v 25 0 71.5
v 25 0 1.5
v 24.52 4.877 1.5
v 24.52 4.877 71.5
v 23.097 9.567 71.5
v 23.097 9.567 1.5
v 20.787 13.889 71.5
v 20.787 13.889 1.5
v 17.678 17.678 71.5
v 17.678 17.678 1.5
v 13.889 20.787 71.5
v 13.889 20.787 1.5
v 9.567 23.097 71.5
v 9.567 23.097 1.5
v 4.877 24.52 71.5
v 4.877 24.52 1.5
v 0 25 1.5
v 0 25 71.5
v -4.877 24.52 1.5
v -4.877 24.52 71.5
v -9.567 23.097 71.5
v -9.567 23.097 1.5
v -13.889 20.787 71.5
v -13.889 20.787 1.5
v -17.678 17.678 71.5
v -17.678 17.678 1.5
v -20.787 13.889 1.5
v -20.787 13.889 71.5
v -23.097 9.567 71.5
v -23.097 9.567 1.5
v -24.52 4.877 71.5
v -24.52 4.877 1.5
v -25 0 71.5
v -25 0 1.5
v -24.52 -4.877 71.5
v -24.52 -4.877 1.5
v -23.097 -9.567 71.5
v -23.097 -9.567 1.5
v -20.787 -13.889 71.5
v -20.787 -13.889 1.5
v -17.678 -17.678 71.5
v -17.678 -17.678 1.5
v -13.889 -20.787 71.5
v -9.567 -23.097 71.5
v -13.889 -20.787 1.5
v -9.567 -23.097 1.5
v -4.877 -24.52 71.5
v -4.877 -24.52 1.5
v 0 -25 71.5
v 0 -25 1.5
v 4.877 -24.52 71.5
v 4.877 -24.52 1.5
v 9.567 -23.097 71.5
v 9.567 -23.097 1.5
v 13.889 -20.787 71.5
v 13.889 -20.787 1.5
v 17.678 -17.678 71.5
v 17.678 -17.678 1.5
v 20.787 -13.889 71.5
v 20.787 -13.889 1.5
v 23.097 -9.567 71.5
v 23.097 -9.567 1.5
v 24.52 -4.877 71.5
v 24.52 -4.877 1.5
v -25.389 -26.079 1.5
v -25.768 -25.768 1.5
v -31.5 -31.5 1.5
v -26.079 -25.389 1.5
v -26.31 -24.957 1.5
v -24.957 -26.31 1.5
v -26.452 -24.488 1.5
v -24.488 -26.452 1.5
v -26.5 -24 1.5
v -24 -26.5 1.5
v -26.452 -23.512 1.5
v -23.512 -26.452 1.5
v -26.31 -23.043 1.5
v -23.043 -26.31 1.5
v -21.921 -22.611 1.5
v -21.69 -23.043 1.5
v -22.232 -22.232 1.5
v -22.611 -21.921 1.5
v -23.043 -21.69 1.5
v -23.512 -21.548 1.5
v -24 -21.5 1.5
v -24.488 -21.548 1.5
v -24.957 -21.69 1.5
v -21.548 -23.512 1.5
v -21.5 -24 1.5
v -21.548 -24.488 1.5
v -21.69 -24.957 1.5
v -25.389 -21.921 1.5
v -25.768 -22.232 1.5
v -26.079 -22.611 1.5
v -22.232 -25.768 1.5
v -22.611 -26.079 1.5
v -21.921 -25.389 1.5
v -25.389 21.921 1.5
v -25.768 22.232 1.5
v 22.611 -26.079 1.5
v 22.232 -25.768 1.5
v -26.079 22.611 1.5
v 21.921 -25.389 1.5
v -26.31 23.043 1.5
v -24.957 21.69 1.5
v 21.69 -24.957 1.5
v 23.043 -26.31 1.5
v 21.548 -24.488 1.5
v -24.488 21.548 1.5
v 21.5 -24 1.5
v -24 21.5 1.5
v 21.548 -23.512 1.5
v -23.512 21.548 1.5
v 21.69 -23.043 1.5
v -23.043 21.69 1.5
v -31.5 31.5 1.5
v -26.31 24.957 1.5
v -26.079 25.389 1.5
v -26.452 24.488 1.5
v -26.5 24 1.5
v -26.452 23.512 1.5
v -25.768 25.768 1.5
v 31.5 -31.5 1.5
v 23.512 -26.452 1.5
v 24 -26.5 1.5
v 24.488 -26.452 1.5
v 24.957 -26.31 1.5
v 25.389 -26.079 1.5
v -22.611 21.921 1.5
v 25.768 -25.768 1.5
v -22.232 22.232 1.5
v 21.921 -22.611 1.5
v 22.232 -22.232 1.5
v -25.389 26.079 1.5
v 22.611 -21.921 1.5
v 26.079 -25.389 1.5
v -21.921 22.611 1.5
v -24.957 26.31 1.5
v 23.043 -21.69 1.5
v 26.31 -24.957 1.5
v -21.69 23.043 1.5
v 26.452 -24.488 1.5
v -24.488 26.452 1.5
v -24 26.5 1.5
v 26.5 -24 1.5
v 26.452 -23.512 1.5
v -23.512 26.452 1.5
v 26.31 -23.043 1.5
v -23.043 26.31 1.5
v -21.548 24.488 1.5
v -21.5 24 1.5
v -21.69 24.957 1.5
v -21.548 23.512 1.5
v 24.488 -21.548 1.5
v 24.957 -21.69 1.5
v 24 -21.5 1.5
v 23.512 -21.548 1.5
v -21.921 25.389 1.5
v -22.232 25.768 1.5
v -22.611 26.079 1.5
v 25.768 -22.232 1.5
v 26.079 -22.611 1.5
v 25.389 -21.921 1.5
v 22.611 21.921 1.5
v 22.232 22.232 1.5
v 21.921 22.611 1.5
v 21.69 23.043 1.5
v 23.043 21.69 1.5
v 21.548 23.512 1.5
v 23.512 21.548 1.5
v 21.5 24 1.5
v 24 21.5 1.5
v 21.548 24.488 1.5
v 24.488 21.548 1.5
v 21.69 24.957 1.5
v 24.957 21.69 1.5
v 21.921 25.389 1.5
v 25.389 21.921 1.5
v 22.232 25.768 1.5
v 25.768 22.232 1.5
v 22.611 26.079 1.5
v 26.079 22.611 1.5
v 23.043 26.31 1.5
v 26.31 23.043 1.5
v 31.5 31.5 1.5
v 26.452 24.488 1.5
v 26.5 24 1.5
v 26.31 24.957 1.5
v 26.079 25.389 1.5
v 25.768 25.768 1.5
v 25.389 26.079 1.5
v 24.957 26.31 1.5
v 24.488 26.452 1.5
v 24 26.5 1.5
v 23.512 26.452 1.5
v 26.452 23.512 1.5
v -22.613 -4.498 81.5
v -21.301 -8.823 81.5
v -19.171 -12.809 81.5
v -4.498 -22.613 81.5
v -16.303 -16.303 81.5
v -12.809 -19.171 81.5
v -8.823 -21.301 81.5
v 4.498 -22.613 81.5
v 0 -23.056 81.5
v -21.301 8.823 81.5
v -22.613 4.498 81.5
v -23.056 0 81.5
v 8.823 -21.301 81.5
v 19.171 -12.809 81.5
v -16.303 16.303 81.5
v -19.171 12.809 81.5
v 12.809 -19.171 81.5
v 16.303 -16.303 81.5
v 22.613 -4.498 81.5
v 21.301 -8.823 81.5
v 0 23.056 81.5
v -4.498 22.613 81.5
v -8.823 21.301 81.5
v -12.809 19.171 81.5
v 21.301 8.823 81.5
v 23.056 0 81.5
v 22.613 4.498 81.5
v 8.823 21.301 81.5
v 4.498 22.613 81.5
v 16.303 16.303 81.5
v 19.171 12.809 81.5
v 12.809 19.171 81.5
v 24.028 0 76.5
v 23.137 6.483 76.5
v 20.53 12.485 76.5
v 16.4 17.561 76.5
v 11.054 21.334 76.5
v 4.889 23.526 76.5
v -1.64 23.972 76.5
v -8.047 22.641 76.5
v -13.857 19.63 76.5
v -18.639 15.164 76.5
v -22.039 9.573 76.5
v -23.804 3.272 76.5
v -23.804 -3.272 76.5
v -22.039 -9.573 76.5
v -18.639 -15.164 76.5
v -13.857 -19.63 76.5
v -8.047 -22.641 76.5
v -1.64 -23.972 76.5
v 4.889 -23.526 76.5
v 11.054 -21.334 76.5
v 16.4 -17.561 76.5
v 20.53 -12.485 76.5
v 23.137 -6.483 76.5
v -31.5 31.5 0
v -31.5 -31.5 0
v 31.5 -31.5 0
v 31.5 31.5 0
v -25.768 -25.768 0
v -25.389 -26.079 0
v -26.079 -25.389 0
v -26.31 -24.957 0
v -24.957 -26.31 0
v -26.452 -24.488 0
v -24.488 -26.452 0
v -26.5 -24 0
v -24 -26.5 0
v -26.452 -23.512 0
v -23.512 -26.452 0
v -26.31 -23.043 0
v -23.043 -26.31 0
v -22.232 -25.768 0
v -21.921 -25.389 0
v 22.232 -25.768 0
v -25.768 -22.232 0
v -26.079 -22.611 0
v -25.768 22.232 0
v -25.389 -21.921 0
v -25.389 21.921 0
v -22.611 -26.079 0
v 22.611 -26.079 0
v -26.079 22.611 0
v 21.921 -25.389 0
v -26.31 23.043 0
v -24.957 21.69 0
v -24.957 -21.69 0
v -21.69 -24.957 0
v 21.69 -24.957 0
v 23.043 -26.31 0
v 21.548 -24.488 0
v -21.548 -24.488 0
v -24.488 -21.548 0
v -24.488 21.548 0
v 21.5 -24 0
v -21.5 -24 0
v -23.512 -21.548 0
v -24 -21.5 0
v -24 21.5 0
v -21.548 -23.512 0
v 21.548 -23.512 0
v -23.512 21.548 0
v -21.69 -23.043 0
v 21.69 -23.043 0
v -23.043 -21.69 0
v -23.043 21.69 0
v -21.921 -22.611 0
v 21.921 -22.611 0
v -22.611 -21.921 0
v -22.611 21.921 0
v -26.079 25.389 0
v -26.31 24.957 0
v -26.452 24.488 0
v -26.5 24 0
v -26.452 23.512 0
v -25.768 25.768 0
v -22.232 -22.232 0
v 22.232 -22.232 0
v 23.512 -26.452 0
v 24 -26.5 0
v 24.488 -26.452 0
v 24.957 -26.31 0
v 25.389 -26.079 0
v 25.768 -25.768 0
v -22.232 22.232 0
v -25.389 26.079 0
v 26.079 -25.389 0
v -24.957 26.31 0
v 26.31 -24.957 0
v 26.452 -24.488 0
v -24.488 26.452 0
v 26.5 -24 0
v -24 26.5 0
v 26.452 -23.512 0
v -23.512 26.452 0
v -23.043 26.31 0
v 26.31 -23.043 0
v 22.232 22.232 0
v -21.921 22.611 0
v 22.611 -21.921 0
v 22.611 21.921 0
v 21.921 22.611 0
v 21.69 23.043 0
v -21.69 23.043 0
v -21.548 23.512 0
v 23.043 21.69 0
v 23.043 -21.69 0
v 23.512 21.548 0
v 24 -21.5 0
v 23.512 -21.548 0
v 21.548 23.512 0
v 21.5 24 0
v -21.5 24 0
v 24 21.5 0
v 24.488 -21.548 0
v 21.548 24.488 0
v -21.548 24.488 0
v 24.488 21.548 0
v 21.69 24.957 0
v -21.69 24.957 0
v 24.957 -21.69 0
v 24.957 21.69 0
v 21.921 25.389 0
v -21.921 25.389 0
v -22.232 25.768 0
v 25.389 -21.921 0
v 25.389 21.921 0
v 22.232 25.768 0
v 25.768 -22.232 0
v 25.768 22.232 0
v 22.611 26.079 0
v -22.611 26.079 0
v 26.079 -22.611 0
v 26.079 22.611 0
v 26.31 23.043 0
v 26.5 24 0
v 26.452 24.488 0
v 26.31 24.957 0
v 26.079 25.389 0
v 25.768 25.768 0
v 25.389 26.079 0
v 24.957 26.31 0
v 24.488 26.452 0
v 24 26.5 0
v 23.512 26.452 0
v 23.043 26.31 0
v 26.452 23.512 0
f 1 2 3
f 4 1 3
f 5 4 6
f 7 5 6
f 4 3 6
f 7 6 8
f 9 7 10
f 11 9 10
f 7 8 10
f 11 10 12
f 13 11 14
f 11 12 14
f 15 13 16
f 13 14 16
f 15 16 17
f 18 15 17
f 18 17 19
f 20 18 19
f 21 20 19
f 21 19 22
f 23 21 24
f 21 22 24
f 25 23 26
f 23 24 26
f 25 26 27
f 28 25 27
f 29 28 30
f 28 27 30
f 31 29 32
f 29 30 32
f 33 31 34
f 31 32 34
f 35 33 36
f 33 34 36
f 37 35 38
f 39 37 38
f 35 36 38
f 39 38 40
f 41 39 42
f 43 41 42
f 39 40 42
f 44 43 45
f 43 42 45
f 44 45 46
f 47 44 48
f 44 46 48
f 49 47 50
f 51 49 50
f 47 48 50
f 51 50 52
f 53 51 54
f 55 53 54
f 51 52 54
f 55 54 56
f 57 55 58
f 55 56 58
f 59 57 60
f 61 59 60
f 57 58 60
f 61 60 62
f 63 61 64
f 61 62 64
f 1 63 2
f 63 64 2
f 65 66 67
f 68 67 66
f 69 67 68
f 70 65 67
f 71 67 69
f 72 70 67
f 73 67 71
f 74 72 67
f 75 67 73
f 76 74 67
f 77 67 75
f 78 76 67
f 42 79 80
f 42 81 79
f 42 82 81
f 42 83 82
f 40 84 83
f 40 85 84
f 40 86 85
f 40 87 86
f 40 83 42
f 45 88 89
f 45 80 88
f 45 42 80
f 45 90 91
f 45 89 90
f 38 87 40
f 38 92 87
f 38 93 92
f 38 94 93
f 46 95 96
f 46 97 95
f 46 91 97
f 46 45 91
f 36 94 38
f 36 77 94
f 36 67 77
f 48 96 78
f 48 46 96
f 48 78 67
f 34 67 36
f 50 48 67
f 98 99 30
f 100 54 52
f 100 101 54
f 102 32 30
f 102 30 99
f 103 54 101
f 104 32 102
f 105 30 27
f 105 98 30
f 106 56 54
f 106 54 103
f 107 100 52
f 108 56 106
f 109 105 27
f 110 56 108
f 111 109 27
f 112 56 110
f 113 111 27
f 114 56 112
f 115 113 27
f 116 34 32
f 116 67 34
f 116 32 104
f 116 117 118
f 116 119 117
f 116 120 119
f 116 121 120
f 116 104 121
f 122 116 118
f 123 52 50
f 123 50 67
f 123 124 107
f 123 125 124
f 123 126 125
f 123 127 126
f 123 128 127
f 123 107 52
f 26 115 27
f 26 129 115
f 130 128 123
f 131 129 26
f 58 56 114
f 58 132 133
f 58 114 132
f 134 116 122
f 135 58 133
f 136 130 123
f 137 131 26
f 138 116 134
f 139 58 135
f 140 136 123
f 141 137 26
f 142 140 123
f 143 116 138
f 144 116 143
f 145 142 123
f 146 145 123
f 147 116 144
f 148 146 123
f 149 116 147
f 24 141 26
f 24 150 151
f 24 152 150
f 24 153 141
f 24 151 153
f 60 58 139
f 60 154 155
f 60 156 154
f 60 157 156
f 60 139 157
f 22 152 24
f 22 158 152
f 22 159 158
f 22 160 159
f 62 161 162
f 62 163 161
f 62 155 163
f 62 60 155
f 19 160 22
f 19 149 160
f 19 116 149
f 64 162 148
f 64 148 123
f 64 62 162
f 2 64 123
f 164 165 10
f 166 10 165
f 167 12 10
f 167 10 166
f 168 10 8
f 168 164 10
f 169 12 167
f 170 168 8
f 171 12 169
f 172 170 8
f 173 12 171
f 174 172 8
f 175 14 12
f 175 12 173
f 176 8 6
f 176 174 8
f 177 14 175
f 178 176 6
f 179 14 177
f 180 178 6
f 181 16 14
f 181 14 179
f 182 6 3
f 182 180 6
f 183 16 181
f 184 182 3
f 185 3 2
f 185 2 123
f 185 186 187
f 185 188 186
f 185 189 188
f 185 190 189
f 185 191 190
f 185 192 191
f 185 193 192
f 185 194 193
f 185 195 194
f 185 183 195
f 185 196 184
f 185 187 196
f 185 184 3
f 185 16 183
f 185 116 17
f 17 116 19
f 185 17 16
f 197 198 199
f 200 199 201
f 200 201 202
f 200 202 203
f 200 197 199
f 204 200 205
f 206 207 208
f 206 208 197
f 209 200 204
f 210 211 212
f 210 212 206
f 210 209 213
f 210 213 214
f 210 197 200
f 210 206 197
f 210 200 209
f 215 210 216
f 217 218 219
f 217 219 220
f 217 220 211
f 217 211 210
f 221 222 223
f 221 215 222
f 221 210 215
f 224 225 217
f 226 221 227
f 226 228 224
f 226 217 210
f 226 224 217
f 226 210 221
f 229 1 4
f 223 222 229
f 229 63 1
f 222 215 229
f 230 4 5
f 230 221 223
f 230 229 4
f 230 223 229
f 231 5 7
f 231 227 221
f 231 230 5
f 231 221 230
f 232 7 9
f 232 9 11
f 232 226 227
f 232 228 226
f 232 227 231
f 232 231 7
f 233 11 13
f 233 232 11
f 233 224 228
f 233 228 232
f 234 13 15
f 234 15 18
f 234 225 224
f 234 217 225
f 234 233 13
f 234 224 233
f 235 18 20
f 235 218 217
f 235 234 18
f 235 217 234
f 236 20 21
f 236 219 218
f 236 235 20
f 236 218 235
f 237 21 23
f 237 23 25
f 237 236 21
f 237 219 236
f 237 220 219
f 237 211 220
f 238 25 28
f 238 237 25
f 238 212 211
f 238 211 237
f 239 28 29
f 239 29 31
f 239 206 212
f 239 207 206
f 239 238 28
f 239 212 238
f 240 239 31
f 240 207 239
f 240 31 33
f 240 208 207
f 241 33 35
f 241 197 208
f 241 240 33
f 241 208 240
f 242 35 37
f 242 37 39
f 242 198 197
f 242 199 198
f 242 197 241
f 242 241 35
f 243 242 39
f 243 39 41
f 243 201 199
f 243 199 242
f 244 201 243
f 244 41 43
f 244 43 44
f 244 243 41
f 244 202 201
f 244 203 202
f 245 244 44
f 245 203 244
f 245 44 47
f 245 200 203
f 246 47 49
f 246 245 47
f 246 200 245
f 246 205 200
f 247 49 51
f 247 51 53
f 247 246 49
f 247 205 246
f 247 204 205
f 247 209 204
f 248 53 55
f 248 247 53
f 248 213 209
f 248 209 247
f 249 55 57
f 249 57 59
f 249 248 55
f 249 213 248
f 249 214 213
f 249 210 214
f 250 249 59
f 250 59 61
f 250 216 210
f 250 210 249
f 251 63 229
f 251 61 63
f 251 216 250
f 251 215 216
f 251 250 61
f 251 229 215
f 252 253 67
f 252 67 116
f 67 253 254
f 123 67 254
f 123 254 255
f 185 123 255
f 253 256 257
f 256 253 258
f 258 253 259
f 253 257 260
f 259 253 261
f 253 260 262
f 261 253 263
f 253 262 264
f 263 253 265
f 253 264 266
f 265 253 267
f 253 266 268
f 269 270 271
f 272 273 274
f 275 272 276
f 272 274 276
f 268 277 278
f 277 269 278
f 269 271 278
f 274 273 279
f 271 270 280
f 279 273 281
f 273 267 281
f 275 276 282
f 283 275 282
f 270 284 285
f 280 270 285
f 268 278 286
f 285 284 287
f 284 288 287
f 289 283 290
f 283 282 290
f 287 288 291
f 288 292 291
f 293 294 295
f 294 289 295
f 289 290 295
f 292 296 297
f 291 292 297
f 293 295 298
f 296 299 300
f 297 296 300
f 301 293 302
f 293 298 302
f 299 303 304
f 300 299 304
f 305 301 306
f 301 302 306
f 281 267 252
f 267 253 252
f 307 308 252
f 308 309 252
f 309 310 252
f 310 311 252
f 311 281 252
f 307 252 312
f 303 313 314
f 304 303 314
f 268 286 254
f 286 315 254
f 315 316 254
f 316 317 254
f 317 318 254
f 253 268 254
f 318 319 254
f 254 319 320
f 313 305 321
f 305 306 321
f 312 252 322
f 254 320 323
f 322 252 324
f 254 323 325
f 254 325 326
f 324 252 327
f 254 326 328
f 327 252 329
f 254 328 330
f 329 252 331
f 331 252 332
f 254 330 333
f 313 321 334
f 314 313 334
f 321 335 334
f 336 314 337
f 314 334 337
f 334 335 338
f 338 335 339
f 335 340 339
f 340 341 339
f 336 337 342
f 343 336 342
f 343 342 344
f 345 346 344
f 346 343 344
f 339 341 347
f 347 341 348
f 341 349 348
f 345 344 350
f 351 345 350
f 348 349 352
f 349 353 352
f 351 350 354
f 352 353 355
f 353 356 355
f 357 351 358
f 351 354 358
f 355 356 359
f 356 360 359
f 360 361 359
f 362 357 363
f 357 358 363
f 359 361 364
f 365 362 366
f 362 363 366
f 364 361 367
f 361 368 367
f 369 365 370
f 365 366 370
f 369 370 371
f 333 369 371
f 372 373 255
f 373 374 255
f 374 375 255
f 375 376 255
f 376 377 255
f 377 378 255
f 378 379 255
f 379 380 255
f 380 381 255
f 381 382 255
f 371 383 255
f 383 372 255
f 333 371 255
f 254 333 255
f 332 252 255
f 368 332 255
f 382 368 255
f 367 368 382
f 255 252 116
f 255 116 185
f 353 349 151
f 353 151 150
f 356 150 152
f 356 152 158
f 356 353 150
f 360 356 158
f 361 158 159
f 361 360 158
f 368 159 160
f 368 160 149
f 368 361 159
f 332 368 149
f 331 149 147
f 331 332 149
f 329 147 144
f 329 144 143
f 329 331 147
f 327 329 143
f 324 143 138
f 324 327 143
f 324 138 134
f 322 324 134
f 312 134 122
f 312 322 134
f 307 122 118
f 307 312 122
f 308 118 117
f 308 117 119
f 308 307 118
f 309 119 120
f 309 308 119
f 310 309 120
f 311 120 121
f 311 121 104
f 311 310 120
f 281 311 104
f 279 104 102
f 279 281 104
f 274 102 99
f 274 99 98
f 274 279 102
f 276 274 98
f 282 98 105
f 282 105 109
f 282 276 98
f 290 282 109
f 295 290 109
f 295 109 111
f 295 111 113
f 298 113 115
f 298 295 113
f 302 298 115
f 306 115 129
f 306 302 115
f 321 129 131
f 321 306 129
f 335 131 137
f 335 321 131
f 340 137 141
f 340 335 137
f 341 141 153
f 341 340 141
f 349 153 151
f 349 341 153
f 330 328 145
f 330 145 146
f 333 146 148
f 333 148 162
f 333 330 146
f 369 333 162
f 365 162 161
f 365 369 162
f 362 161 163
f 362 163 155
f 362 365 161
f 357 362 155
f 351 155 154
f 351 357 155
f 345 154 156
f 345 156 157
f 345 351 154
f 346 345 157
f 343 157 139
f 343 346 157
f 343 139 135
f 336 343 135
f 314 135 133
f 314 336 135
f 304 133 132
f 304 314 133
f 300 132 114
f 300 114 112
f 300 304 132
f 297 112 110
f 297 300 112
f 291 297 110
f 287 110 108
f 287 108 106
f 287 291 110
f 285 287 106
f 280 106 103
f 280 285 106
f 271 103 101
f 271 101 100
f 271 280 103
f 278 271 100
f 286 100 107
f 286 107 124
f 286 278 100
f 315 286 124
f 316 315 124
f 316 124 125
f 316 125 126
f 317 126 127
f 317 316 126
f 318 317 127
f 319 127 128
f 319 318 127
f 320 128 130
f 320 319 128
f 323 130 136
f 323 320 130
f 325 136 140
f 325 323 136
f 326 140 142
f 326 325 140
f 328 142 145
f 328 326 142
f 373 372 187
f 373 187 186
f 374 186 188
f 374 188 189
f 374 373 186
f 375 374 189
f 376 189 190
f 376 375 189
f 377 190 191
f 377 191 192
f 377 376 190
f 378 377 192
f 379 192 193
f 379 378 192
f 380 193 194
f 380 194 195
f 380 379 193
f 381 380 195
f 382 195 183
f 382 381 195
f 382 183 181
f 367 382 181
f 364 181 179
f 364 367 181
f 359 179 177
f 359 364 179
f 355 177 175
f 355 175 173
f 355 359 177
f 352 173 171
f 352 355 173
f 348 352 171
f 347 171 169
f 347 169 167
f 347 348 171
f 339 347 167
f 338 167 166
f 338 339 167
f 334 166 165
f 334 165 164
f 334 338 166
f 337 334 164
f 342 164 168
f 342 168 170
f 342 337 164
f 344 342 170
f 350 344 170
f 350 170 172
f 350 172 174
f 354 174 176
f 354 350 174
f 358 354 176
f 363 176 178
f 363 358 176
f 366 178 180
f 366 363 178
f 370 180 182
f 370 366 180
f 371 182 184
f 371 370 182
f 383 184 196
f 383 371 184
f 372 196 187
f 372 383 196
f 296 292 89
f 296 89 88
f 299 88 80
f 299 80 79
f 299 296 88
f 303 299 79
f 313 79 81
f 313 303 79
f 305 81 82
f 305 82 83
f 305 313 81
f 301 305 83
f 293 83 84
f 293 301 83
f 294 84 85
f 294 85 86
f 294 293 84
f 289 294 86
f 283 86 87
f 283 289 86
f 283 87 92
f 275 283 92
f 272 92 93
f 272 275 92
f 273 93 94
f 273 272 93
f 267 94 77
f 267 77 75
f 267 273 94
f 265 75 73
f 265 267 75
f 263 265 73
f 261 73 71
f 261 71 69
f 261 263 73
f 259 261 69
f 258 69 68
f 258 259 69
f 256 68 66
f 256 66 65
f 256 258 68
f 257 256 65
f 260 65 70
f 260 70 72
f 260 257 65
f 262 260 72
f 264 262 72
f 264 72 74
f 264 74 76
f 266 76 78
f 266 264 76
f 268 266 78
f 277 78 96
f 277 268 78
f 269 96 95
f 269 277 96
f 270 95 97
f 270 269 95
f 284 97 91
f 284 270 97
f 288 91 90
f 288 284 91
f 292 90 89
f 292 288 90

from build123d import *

# Parameters (mm, degrees)
SKETCH1_W           = 63
SKETCH1_H           = 63
SKETCH1_R           = 2.5
BOSS_EXTRUDE1_DEPTH = 1.5
SKETCH2_R           = 25
BOSS_EXTRUDE2_DEPTH = 80
CHAMFER1_SIZE       = 10
CHAMFER1_SIZE2      = 1.943803091


with BuildPart() as part:
    # Sketch1 → Boss-Extrude1 (new body)
    with BuildSketch(Plane.XY):
        Rectangle(SKETCH1_W, SKETCH1_H)
        with Locations((24, 24)):
            Circle(SKETCH1_R, mode=Mode.SUBTRACT)
        with Locations((24, -24)):
            Circle(SKETCH1_R, mode=Mode.SUBTRACT)
        with Locations((-24, -24)):
            Circle(SKETCH1_R, mode=Mode.SUBTRACT)
        with Locations((-24, 24)):
            Circle(SKETCH1_R, mode=Mode.SUBTRACT)
    extrude(amount=BOSS_EXTRUDE1_DEPTH)

    # Sketch2 → Boss-Extrude2 (add)
    with BuildSketch(Plane.XY.offset(1.5)):
        Circle(SKETCH2_R)
    extrude(amount=BOSS_EXTRUDE2_DEPTH)

    # Chamfer1
    chamfer1_edges = [part.edges().sort_by_distance(p)[0] for p in [
        (-25, 0, 81.5),
    ]]
    chamfer1_side = [part.faces().sort_by_distance(p)[0] for p in [
        (-25, 0, 41.5),
    ]]
    chamfer(chamfer1_edges, length=CHAMFER1_SIZE, length2=CHAMFER1_SIZE2, reference=chamfer1_side[0])


solid = part.part
